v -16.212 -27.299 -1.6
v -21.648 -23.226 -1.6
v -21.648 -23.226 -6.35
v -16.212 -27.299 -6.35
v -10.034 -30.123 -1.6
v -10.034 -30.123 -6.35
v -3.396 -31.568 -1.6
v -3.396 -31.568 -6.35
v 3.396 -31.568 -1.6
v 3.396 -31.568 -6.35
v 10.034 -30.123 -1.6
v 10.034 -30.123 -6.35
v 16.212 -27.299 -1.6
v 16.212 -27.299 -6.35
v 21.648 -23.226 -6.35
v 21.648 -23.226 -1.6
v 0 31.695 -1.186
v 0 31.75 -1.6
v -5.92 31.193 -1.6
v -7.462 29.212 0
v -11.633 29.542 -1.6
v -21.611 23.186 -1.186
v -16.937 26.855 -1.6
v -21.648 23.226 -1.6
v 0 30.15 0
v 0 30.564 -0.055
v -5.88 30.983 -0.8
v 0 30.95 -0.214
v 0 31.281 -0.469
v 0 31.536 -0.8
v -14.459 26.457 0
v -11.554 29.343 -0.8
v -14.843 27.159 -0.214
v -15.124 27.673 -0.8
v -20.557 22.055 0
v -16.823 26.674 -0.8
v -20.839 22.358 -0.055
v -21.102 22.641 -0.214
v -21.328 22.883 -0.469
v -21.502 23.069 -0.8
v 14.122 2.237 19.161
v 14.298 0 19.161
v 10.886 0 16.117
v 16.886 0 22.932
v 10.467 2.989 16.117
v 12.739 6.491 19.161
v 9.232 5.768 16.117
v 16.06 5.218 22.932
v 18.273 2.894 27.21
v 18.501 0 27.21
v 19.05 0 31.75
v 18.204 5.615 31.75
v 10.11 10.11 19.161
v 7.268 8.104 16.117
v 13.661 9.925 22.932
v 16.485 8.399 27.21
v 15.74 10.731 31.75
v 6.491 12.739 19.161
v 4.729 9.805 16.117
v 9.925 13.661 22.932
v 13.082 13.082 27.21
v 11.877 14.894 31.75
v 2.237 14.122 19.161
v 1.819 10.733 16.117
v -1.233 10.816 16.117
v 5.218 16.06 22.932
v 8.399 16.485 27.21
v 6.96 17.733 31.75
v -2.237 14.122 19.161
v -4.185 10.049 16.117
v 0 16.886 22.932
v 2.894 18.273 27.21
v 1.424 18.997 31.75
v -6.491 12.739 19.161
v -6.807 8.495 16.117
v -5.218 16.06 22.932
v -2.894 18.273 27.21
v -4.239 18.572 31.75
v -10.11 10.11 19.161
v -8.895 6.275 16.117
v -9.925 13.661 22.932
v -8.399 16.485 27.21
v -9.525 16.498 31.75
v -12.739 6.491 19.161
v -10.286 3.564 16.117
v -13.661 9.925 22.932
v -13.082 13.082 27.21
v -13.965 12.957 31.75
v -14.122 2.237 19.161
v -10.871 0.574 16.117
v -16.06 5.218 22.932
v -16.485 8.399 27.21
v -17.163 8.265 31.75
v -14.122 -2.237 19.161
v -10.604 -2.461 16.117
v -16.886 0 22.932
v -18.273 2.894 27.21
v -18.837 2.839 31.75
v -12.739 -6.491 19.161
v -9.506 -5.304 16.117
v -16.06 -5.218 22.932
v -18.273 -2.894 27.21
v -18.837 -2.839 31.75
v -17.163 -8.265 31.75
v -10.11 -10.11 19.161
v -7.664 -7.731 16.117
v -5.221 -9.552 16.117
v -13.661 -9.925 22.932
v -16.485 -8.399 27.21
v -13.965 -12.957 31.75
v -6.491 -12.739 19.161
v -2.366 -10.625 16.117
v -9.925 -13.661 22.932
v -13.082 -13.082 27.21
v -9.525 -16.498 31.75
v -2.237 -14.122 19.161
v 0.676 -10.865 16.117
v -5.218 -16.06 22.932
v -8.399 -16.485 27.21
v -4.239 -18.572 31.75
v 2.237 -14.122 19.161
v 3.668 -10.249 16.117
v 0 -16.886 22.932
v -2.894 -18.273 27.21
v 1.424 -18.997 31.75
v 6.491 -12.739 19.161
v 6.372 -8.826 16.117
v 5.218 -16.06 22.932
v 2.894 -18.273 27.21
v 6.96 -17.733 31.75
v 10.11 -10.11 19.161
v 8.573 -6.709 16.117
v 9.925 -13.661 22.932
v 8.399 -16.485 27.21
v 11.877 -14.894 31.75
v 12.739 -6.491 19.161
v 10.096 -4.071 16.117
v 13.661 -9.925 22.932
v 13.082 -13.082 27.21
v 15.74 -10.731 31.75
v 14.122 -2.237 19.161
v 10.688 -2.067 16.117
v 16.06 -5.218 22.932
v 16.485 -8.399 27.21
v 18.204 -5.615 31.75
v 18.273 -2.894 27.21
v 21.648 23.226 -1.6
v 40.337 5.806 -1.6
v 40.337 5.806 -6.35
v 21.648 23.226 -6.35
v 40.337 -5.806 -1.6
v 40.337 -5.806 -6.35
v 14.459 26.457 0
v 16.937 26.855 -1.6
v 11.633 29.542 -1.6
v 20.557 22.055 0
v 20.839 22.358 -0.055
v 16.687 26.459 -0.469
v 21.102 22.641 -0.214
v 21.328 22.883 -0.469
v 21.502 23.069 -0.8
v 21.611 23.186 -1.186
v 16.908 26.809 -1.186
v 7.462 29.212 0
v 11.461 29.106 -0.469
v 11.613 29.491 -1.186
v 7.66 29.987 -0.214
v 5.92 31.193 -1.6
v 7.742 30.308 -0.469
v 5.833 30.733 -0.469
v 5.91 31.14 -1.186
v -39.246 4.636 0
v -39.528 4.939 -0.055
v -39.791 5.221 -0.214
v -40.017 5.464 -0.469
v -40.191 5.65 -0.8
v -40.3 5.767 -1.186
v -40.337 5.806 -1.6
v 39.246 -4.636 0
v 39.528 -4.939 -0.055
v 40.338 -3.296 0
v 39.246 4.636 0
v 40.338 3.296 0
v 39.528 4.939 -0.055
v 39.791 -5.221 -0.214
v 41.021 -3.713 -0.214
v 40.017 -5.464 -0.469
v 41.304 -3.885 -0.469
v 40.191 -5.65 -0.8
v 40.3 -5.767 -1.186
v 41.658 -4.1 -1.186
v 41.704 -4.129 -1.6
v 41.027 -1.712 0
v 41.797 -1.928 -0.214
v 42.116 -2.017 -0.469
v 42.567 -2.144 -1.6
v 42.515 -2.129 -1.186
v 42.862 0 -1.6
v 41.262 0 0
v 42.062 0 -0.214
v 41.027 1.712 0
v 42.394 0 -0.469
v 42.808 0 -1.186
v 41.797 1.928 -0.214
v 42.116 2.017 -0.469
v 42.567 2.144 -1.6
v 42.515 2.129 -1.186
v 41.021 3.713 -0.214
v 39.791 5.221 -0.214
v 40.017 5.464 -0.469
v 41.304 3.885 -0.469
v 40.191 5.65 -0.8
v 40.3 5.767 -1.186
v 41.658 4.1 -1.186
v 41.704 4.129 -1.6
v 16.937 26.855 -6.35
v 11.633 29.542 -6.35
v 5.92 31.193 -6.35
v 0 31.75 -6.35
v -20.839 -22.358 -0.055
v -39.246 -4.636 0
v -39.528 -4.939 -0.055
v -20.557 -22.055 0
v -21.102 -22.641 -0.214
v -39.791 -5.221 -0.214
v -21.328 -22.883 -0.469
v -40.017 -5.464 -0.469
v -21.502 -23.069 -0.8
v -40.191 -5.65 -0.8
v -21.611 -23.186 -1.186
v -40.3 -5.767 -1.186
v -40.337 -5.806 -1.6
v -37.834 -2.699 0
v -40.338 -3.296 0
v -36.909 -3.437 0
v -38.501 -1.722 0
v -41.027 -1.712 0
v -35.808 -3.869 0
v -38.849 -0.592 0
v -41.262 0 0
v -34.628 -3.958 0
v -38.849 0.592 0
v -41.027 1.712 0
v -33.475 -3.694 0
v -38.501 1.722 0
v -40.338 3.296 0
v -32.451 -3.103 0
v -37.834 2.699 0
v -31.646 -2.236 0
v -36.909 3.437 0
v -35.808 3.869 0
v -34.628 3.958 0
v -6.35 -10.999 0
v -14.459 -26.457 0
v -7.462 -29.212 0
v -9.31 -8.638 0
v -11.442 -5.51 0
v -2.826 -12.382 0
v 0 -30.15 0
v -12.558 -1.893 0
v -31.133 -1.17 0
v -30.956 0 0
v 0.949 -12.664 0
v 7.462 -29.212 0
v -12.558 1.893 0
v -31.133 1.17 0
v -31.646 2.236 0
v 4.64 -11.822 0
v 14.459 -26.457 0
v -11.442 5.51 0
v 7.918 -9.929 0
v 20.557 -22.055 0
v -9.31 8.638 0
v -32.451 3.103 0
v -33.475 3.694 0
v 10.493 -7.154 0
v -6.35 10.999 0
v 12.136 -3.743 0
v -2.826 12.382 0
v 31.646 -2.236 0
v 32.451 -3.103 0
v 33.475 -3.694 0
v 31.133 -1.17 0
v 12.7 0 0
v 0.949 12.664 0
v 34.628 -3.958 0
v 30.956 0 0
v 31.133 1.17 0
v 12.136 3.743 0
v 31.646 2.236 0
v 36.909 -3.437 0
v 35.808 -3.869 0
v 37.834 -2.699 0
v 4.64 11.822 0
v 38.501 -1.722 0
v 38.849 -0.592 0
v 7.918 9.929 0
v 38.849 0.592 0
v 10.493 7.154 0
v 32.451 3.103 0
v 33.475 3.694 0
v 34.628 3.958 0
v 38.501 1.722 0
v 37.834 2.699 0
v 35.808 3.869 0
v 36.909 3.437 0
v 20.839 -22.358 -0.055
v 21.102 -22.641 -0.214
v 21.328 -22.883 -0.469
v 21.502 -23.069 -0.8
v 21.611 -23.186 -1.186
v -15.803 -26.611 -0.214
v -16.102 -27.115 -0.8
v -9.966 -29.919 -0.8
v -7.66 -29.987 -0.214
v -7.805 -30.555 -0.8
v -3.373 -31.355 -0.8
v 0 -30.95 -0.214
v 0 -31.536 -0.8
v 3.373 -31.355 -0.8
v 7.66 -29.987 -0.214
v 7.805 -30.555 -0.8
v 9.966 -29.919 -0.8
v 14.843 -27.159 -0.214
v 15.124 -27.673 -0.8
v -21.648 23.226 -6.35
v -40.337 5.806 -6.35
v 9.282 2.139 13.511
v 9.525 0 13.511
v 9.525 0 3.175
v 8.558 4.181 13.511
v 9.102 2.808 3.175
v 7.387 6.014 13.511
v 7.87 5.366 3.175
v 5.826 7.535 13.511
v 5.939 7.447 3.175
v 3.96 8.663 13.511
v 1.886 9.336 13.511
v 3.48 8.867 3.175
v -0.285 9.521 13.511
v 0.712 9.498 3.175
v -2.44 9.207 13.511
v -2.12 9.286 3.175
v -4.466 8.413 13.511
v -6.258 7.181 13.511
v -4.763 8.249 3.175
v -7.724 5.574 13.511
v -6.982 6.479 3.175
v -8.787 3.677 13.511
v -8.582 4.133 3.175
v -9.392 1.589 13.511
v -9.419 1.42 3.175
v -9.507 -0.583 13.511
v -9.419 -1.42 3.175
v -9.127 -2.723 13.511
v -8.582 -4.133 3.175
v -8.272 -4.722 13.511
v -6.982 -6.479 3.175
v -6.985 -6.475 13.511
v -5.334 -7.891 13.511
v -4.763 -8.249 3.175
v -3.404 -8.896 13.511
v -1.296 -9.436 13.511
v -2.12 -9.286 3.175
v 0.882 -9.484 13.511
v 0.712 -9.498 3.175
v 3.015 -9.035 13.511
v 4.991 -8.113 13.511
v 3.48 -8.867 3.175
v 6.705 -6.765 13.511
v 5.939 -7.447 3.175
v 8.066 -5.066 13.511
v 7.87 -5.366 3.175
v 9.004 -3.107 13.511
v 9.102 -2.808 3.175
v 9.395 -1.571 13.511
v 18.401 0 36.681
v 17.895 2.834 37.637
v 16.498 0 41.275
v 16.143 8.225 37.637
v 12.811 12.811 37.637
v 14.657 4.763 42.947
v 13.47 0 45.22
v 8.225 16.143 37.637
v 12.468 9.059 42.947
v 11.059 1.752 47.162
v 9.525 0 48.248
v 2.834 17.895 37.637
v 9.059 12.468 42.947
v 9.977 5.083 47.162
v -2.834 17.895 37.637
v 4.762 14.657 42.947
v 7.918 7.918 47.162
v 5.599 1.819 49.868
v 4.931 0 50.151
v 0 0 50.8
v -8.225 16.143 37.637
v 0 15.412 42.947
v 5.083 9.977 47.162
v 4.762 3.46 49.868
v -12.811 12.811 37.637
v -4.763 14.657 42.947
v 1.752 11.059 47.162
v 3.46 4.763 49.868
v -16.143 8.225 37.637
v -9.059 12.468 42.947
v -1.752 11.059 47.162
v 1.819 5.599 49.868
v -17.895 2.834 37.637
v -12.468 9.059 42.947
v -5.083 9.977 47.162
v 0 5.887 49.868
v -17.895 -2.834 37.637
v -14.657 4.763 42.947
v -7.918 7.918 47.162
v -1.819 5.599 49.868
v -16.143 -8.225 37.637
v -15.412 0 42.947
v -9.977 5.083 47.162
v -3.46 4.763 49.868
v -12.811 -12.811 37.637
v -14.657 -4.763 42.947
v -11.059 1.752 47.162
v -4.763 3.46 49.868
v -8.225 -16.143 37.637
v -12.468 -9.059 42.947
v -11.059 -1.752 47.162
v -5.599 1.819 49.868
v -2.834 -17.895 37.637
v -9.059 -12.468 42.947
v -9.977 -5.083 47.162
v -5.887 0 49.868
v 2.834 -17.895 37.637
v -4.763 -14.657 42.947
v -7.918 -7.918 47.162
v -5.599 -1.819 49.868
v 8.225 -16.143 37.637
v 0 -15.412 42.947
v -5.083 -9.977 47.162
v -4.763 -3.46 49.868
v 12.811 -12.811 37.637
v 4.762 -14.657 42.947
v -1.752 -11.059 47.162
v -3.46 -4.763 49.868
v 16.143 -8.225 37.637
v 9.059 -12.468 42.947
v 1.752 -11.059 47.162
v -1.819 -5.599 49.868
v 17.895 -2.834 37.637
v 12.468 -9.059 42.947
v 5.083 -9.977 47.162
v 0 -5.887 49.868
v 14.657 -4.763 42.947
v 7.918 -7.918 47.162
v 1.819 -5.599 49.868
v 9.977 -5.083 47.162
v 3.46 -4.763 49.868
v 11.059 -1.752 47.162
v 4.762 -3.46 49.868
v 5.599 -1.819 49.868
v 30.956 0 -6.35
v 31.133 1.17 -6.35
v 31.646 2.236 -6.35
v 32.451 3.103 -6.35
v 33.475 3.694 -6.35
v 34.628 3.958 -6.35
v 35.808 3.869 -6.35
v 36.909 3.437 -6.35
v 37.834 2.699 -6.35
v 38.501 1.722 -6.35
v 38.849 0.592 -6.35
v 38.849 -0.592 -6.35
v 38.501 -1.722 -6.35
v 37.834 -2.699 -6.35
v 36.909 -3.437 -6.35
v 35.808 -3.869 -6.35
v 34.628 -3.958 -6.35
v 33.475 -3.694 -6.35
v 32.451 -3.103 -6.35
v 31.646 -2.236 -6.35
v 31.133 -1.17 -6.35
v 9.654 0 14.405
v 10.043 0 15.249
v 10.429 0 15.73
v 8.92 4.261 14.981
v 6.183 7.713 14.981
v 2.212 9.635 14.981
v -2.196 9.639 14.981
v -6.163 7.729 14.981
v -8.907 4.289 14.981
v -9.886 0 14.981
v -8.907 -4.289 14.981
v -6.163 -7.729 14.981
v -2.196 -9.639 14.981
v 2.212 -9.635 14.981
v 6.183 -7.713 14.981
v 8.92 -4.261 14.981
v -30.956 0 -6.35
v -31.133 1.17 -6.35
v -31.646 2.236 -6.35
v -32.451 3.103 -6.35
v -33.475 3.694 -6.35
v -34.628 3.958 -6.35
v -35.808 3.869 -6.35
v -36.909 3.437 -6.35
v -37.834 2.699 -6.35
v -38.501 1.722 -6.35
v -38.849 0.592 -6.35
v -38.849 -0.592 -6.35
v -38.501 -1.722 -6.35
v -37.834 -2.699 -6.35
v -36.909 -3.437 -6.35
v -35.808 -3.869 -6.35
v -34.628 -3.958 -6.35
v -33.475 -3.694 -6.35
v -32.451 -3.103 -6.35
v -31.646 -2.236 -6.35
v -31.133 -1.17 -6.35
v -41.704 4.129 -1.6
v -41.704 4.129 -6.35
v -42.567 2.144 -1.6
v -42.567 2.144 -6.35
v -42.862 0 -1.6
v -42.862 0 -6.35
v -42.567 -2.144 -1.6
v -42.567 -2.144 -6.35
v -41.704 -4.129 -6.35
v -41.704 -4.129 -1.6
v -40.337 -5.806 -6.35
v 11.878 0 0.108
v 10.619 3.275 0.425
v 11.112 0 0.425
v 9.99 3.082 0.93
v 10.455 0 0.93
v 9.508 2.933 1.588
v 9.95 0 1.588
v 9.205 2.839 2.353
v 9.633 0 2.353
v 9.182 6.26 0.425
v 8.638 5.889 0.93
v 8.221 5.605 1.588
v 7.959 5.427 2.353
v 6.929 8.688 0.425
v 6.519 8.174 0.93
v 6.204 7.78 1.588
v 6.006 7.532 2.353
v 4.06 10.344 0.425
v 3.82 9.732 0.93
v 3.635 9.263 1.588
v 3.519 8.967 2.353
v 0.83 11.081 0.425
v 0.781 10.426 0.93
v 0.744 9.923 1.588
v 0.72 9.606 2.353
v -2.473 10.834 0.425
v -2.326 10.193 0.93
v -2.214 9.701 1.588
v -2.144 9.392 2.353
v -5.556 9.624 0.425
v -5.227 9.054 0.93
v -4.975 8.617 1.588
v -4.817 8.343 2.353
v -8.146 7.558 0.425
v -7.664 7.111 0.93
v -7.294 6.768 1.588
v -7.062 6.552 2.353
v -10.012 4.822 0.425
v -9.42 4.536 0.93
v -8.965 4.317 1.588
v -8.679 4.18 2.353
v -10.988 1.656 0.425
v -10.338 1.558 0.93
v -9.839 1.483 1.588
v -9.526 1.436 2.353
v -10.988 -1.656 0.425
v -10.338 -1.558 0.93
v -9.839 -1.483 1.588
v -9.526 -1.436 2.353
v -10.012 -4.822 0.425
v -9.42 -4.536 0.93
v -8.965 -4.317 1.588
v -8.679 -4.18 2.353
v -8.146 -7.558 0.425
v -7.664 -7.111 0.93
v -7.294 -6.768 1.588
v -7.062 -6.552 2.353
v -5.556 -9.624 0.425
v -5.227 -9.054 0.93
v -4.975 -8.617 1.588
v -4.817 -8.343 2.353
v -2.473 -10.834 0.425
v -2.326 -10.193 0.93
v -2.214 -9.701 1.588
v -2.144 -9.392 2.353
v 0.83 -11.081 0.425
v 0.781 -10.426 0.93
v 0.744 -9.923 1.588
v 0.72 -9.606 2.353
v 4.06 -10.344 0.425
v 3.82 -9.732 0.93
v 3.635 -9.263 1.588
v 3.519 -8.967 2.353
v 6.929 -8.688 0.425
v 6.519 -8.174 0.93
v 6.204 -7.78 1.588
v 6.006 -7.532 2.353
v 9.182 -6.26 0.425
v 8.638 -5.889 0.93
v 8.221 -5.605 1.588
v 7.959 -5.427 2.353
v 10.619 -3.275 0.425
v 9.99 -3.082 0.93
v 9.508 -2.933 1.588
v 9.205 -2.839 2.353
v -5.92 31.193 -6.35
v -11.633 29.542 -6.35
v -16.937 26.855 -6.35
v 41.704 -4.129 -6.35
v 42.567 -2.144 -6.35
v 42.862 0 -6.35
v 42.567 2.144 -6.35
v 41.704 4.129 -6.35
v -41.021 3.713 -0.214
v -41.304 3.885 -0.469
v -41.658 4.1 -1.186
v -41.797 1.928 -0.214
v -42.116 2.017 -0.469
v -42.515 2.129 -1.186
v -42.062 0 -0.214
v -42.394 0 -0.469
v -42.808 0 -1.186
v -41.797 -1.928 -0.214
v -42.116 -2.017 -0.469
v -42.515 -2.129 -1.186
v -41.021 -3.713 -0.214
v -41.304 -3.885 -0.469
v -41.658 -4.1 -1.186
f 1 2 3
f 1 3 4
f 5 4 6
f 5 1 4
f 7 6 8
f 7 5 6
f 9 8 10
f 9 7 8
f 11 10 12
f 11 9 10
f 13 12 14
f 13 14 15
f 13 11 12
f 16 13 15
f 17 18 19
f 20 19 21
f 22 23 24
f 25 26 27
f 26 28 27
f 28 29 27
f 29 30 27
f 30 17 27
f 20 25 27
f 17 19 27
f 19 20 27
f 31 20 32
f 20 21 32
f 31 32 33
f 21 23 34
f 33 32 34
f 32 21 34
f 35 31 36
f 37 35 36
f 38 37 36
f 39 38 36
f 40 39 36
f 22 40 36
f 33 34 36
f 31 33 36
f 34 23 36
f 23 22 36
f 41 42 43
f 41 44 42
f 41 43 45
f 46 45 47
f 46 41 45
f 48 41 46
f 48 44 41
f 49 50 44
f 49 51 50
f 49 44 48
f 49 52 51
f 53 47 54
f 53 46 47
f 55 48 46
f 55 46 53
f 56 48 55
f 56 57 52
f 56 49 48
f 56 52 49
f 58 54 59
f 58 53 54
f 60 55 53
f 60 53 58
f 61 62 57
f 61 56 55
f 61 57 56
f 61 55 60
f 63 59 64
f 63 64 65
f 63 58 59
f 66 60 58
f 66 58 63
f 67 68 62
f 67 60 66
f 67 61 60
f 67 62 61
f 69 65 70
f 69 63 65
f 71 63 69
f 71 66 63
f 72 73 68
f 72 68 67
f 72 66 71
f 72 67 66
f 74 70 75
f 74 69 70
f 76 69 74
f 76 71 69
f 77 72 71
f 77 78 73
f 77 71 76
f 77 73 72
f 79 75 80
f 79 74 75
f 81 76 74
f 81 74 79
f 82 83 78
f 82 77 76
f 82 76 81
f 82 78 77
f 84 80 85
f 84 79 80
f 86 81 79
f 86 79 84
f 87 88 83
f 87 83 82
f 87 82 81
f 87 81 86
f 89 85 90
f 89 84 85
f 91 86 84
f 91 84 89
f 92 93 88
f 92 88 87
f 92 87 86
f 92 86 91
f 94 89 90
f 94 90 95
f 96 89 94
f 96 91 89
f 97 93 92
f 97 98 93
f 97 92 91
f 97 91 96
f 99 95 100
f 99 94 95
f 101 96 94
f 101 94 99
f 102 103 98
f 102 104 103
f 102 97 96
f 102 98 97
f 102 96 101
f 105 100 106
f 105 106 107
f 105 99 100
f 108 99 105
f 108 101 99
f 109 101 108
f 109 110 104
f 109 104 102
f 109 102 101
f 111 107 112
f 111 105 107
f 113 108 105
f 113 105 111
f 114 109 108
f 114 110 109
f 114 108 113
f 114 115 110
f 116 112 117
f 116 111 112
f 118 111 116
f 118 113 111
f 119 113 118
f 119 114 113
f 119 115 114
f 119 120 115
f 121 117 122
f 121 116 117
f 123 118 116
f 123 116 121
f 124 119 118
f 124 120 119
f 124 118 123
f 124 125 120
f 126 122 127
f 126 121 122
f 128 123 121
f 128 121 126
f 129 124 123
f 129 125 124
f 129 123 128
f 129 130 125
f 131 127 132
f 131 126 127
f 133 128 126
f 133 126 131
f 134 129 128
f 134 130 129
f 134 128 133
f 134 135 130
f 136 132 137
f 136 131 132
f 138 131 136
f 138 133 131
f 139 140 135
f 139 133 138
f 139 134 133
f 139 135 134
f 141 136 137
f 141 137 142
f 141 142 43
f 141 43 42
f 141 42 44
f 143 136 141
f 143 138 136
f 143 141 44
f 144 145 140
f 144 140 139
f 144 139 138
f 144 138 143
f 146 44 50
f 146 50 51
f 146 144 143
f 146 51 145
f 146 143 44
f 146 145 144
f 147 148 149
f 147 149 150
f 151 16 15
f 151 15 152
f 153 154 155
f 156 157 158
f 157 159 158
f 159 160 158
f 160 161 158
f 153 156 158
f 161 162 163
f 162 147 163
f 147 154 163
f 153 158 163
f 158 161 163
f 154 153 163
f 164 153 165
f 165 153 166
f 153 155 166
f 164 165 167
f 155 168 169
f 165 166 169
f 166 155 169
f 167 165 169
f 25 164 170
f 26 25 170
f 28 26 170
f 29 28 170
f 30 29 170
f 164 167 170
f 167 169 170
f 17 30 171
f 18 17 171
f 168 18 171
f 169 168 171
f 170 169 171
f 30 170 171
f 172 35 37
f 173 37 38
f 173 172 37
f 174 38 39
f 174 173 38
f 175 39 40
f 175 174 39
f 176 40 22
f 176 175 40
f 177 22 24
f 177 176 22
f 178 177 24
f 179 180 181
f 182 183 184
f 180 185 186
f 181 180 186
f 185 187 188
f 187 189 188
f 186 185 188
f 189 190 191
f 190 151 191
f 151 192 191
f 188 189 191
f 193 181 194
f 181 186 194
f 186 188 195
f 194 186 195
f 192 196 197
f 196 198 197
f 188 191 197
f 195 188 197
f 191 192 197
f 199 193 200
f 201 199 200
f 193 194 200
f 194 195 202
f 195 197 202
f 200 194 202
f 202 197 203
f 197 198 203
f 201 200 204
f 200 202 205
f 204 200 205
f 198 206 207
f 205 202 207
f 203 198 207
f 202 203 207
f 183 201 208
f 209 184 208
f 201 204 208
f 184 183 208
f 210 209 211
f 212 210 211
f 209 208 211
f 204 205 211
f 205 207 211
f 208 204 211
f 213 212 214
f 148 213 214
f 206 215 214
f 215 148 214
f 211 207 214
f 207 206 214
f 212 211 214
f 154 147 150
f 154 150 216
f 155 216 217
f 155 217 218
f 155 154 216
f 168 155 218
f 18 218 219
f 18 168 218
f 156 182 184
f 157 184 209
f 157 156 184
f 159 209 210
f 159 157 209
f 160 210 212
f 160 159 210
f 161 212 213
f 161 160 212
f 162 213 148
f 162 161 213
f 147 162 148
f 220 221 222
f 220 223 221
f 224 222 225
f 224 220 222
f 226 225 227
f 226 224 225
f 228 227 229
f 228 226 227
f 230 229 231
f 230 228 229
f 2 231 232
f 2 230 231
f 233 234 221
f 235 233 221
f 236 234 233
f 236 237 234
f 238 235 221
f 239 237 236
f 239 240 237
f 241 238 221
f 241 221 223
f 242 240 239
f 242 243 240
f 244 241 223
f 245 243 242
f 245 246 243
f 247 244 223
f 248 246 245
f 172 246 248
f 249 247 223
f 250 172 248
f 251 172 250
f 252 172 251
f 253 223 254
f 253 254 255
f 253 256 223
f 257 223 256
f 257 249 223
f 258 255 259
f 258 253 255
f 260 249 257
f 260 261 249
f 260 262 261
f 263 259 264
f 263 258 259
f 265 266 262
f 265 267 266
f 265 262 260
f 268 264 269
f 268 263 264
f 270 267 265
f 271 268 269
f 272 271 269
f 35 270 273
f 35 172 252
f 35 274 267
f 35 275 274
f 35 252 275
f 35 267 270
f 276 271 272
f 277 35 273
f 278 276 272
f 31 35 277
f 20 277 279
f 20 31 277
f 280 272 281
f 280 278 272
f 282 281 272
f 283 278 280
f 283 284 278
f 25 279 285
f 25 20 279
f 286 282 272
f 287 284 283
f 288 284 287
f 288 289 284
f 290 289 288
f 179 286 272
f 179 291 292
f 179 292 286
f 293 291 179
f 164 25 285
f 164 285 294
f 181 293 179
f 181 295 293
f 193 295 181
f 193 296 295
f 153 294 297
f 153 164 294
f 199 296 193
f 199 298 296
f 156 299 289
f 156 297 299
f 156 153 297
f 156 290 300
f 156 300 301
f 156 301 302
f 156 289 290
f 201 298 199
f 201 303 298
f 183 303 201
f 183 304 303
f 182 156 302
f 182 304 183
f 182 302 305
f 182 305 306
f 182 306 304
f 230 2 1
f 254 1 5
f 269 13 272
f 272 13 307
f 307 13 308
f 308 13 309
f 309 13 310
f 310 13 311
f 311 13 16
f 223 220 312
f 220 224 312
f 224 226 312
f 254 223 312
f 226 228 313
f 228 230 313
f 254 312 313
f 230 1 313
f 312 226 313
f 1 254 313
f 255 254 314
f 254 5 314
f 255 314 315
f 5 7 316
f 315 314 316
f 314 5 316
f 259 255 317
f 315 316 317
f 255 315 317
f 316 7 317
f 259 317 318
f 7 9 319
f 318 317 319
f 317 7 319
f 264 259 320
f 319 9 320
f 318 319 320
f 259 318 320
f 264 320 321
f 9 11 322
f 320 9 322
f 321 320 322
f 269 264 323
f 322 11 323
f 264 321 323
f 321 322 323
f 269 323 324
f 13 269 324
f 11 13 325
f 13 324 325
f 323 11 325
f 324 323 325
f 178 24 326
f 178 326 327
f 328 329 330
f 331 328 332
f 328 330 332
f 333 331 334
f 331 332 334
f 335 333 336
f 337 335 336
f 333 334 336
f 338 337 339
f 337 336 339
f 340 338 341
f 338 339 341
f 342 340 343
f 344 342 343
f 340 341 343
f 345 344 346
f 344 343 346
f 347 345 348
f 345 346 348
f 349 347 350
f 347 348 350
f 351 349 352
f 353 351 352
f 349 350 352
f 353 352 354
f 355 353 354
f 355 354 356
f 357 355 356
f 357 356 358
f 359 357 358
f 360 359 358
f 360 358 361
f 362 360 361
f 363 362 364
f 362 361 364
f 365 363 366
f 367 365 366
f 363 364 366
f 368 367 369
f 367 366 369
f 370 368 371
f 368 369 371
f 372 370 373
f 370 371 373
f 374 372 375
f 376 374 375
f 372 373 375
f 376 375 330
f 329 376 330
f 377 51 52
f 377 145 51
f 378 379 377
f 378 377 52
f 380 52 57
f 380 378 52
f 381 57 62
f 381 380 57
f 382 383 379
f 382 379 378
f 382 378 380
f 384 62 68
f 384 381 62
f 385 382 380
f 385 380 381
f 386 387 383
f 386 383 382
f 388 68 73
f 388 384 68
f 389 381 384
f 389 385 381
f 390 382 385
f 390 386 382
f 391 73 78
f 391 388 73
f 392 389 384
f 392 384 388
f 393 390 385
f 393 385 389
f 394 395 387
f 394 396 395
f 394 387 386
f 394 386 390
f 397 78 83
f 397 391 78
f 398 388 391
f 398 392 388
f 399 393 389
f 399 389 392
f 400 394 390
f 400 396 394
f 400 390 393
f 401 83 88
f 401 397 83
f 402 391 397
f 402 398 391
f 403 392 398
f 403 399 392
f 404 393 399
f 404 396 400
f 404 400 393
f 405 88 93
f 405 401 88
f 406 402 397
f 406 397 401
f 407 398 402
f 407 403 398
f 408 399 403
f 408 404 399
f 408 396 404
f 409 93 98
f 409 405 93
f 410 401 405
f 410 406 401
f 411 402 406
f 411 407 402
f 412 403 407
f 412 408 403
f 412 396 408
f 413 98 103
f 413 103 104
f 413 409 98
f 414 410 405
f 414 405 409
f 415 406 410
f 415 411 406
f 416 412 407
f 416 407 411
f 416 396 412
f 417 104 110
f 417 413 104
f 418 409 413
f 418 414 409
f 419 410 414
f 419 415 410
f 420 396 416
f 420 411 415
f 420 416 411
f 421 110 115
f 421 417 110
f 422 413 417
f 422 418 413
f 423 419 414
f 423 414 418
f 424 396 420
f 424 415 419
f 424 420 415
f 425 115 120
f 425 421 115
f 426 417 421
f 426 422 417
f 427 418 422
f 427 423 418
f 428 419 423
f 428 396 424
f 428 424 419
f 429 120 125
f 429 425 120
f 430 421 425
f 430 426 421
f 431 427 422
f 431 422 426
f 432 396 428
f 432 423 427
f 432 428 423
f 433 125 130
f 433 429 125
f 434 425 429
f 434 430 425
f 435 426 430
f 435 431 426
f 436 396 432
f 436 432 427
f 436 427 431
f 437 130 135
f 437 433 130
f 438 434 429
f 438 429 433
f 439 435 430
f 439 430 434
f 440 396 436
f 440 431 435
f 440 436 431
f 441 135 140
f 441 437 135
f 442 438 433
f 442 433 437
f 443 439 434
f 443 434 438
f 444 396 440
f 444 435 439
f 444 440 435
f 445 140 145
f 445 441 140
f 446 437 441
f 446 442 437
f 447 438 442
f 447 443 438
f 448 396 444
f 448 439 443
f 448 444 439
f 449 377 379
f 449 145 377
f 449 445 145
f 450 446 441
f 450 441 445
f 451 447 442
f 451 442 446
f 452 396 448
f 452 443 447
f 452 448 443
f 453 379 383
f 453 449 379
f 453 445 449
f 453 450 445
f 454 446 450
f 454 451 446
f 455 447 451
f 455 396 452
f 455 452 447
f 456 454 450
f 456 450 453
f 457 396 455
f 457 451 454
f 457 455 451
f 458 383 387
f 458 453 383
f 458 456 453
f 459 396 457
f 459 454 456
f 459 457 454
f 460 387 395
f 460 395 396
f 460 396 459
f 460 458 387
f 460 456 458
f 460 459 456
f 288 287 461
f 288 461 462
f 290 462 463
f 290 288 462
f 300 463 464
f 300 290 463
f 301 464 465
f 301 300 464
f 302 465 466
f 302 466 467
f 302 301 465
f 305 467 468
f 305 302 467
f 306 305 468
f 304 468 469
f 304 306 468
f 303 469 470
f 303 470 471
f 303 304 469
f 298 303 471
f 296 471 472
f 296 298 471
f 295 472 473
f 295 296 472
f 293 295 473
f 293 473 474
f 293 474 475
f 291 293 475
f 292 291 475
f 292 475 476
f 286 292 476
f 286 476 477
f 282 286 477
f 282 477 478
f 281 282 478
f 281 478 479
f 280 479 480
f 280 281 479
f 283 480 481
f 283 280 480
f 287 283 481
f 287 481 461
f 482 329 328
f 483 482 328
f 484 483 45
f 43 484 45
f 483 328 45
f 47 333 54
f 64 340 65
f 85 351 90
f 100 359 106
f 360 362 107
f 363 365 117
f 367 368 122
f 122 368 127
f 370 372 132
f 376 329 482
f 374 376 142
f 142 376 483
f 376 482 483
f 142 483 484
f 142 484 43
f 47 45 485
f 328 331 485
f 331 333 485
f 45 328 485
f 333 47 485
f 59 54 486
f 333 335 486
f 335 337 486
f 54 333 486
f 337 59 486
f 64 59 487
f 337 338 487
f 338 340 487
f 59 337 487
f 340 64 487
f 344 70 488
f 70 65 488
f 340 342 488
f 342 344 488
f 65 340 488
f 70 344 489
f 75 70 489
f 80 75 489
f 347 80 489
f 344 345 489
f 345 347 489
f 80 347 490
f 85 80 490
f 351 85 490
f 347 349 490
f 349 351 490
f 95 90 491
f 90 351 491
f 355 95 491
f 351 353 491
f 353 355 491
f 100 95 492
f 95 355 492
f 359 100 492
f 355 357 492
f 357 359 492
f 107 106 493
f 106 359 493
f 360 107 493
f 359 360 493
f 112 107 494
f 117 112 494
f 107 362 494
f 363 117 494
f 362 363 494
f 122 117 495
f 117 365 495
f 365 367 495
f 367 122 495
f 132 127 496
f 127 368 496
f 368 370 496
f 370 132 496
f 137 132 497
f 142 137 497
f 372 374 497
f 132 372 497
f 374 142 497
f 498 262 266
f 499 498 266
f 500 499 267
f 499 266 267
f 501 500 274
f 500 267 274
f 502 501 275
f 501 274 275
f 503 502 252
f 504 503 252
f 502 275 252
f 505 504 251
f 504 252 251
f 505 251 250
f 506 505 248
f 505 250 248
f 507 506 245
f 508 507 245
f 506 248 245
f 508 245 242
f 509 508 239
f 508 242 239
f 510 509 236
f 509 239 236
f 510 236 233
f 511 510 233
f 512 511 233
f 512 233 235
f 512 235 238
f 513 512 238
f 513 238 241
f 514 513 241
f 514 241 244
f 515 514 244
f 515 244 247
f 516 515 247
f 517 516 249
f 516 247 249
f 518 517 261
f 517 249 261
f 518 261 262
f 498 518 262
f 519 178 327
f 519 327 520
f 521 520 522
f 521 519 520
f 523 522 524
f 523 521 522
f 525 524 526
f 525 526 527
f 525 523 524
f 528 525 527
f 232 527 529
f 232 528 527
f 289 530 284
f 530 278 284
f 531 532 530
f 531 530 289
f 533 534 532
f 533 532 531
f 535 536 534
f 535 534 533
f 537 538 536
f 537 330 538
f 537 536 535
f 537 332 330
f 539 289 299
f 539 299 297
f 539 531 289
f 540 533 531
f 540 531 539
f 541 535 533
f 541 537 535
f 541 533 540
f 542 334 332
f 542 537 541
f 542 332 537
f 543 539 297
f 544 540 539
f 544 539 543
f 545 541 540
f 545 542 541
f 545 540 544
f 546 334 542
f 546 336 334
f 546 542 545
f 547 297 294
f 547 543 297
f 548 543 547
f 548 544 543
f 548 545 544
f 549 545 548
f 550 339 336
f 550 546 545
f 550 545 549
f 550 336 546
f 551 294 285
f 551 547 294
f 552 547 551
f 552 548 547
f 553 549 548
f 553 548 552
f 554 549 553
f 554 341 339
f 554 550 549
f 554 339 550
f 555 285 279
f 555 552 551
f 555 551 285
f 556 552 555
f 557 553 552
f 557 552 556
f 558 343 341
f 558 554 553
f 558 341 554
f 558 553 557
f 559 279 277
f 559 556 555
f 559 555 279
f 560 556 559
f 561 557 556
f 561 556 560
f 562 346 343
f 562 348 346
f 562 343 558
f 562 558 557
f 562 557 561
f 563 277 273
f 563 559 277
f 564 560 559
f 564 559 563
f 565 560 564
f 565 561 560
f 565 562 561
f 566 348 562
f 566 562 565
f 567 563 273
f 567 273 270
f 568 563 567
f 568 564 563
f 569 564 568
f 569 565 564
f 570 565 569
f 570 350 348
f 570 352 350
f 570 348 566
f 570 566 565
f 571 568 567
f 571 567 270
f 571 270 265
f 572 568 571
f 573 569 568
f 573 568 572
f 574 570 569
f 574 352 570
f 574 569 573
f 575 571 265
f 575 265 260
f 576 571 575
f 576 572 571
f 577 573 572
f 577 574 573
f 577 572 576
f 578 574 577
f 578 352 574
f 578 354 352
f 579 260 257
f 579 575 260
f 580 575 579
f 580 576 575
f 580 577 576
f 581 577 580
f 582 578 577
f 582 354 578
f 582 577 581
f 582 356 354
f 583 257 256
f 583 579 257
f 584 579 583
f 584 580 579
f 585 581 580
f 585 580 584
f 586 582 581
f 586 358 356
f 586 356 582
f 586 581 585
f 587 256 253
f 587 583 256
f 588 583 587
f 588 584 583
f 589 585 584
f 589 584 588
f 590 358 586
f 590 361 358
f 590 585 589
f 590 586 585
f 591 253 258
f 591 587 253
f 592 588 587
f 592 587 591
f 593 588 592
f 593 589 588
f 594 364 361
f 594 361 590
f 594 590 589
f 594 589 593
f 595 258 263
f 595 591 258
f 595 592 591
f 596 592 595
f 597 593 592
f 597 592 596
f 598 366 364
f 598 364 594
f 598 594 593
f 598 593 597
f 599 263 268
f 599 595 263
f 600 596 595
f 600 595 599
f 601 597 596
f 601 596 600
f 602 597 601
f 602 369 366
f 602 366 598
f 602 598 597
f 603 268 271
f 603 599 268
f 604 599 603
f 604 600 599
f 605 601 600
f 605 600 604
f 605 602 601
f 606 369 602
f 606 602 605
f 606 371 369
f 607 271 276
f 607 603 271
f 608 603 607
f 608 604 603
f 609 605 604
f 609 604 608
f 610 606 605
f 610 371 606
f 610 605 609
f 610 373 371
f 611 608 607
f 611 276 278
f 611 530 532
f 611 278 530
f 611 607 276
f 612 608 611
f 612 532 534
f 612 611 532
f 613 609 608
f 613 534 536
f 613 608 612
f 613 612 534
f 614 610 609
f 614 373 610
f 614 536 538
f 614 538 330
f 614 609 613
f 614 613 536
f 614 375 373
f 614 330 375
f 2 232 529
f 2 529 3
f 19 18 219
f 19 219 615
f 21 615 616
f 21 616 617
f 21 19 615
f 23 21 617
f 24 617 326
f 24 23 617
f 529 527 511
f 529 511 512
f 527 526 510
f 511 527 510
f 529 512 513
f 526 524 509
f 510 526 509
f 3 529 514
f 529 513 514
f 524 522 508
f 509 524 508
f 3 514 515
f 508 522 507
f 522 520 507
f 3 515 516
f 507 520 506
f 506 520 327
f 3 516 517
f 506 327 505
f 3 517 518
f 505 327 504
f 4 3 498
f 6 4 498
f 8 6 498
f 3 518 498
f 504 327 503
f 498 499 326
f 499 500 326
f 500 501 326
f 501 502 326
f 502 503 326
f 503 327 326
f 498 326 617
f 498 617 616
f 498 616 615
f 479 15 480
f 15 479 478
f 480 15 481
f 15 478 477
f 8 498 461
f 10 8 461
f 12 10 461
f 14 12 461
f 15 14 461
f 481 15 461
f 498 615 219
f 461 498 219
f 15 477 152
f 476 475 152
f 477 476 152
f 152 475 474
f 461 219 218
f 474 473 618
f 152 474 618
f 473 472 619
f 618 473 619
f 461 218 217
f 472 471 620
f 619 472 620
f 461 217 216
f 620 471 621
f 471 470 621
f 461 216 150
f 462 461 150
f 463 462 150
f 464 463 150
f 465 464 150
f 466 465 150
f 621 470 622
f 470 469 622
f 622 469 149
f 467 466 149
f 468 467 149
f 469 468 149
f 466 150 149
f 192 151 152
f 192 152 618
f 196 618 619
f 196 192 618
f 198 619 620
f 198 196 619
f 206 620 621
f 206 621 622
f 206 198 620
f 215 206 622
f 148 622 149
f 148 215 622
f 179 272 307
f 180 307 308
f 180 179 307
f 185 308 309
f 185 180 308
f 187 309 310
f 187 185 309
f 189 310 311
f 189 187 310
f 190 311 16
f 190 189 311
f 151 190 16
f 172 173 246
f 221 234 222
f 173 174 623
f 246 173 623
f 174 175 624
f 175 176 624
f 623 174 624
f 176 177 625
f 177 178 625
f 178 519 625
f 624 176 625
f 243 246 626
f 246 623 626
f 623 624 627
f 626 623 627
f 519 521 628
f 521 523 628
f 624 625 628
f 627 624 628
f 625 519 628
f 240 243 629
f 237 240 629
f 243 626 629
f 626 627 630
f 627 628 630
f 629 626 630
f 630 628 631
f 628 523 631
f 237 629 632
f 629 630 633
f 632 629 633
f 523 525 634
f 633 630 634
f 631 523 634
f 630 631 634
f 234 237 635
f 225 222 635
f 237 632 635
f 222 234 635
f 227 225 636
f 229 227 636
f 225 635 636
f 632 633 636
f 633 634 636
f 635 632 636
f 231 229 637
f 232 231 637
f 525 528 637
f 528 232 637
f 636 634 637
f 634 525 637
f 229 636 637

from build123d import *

# Parameters (mm, degrees)
F0_R     = 3.96875
F1_DEPTH = 6.35
F4_DEPTH = 15.2522160579
F5_R     = 1.6002
F6_R     = 3.175


with BuildPart() as f1:
    # F0 (on Top) → F1 (new body)
    with BuildSketch(Plane.XY):
        with BuildLine():
            Line((40.3369318182, 5.8064533276), (21.6477272727, 23.2258133103))
            ThreePointArc((21.6477272727, 23.2258133103), (11.6327754082, 29.5421907837), (0, 31.75))
            ThreePointArc((0, 31.75), (-11.6327754082, 29.5421907837), (-21.6477272727, 23.2258133103))
            Line((-21.6477272727, 23.2258133103), (-40.3369318182, 5.8064533276))
            ThreePointArc((-40.3369318182, 5.8064533276), (-42.8625, 0), (-40.3369318182, -5.8064533276))
            Line((-40.3369318182, -5.8064533276), (-21.6477272727, -23.2258133103))
            ThreePointArc((-21.6477272727, -23.2258133103), (0, -31.75), (21.6477272727, -23.2258133103))
            Line((21.6477272727, -23.2258133103), (40.3369318182, -5.8064533276))
            ThreePointArc((40.3369318182, -5.8064533276), (42.8625, 0), (40.3369318182, 5.8064533276))
        make_face()
        with Locations((-34.925, 0)):
            Circle(F0_R, mode=Mode.SUBTRACT)
        with BuildLine():
            ThreePointArc((9.525, 0), (-6.7351920908, -6.7351920908), (0, 9.525))
            ThreePointArc((0, 9.525), (6.7351920908, 6.7351920908), (9.525, 0))
        make_face(mode=Mode.SUBTRACT)
        with BuildLine():
            ThreePointArc((38.89375, 0), (34.925, -3.96875), (30.95625, 0))
            ThreePointArc((30.95625, 0), (34.925, 3.96875), (38.89375, 0))
        make_face(mode=Mode.SUBTRACT)
        with BuildLine():
            Line((0, 0), (0, 9.525))
            ThreePointArc((0, 9.525), (-6.7351920908, -6.7351920908), (9.525, 0))
            Line((9.525, 0), (0, 0))
        make_face()
        with BuildLine():
            ThreePointArc((9.525, 0), (6.7351920908, 6.7351920908), (0, 9.525))
            Line((0, 9.525), (0, 0))
            Line((0, 0), (9.525, 0))
        make_face()
    extrude(amount=-F1_DEPTH)



with BuildPart() as f3:
    # F2 (on Front) → F3 (revolve)
    with BuildSketch(Plane.XZ):
        with BuildLine():
            Line((0, 50.8), (0, 12.7))
            ThreePointArc((0, 12.7), (13.4703841816, 18.2796158184), (19.05, 31.75))
            ThreePointArc((19.05, 31.75), (13.4703841816, 45.2203841816), (0, 50.8))
        make_face()
    revolve(axis=Axis((0, 0, 25.4), (0, 0, 1)))


with BuildPart() as f1_1:
    add(f1.part)

    add(f3.part)  # F4 merges F3
    # F0 (on Top) → F4 (join, through all)
    with BuildSketch(Plane.XY):
        with BuildLine():
            Line((0, 0), (0, 9.525))
            ThreePointArc((0, 9.525), (-6.7351920908, -6.7351920908), (9.525, 0))
            Line((9.525, 0), (0, 0))
        make_face()
        with BuildLine():
            ThreePointArc((9.525, 0), (6.7351920908, 6.7351920908), (0, 9.525))
            Line((0, 9.525), (0, 0))
            Line((0, 0), (9.525, 0))
        make_face()
    extrude(amount=F4_DEPTH)

    # F5
    f5_edges = [f1_1.edges().sort_by_distance(p)[0] for p in [
        (0, -31.75, 0),
        (42.8625, 0, 0),
        (30.99233, -14.516133, 0),
        (30.99233, 14.516133, 0),
        (0, 31.75, 0),
        (-30.99233, -14.516133, 0),
        (-30.99233, 14.516133, 0),
        (-42.8625, 0, 0),
    ]]
    fillet(f5_edges, radius=F5_R)

    # F6
    f6_edges = [f1_1.edges().sort_by_distance(p)[0] for p in [
        (-9.525, 0, 15.252216),
        (-9.525, 0, 0),
    ]]
    fillet(f6_edges, radius=F6_R)


solid = f1_1.part
